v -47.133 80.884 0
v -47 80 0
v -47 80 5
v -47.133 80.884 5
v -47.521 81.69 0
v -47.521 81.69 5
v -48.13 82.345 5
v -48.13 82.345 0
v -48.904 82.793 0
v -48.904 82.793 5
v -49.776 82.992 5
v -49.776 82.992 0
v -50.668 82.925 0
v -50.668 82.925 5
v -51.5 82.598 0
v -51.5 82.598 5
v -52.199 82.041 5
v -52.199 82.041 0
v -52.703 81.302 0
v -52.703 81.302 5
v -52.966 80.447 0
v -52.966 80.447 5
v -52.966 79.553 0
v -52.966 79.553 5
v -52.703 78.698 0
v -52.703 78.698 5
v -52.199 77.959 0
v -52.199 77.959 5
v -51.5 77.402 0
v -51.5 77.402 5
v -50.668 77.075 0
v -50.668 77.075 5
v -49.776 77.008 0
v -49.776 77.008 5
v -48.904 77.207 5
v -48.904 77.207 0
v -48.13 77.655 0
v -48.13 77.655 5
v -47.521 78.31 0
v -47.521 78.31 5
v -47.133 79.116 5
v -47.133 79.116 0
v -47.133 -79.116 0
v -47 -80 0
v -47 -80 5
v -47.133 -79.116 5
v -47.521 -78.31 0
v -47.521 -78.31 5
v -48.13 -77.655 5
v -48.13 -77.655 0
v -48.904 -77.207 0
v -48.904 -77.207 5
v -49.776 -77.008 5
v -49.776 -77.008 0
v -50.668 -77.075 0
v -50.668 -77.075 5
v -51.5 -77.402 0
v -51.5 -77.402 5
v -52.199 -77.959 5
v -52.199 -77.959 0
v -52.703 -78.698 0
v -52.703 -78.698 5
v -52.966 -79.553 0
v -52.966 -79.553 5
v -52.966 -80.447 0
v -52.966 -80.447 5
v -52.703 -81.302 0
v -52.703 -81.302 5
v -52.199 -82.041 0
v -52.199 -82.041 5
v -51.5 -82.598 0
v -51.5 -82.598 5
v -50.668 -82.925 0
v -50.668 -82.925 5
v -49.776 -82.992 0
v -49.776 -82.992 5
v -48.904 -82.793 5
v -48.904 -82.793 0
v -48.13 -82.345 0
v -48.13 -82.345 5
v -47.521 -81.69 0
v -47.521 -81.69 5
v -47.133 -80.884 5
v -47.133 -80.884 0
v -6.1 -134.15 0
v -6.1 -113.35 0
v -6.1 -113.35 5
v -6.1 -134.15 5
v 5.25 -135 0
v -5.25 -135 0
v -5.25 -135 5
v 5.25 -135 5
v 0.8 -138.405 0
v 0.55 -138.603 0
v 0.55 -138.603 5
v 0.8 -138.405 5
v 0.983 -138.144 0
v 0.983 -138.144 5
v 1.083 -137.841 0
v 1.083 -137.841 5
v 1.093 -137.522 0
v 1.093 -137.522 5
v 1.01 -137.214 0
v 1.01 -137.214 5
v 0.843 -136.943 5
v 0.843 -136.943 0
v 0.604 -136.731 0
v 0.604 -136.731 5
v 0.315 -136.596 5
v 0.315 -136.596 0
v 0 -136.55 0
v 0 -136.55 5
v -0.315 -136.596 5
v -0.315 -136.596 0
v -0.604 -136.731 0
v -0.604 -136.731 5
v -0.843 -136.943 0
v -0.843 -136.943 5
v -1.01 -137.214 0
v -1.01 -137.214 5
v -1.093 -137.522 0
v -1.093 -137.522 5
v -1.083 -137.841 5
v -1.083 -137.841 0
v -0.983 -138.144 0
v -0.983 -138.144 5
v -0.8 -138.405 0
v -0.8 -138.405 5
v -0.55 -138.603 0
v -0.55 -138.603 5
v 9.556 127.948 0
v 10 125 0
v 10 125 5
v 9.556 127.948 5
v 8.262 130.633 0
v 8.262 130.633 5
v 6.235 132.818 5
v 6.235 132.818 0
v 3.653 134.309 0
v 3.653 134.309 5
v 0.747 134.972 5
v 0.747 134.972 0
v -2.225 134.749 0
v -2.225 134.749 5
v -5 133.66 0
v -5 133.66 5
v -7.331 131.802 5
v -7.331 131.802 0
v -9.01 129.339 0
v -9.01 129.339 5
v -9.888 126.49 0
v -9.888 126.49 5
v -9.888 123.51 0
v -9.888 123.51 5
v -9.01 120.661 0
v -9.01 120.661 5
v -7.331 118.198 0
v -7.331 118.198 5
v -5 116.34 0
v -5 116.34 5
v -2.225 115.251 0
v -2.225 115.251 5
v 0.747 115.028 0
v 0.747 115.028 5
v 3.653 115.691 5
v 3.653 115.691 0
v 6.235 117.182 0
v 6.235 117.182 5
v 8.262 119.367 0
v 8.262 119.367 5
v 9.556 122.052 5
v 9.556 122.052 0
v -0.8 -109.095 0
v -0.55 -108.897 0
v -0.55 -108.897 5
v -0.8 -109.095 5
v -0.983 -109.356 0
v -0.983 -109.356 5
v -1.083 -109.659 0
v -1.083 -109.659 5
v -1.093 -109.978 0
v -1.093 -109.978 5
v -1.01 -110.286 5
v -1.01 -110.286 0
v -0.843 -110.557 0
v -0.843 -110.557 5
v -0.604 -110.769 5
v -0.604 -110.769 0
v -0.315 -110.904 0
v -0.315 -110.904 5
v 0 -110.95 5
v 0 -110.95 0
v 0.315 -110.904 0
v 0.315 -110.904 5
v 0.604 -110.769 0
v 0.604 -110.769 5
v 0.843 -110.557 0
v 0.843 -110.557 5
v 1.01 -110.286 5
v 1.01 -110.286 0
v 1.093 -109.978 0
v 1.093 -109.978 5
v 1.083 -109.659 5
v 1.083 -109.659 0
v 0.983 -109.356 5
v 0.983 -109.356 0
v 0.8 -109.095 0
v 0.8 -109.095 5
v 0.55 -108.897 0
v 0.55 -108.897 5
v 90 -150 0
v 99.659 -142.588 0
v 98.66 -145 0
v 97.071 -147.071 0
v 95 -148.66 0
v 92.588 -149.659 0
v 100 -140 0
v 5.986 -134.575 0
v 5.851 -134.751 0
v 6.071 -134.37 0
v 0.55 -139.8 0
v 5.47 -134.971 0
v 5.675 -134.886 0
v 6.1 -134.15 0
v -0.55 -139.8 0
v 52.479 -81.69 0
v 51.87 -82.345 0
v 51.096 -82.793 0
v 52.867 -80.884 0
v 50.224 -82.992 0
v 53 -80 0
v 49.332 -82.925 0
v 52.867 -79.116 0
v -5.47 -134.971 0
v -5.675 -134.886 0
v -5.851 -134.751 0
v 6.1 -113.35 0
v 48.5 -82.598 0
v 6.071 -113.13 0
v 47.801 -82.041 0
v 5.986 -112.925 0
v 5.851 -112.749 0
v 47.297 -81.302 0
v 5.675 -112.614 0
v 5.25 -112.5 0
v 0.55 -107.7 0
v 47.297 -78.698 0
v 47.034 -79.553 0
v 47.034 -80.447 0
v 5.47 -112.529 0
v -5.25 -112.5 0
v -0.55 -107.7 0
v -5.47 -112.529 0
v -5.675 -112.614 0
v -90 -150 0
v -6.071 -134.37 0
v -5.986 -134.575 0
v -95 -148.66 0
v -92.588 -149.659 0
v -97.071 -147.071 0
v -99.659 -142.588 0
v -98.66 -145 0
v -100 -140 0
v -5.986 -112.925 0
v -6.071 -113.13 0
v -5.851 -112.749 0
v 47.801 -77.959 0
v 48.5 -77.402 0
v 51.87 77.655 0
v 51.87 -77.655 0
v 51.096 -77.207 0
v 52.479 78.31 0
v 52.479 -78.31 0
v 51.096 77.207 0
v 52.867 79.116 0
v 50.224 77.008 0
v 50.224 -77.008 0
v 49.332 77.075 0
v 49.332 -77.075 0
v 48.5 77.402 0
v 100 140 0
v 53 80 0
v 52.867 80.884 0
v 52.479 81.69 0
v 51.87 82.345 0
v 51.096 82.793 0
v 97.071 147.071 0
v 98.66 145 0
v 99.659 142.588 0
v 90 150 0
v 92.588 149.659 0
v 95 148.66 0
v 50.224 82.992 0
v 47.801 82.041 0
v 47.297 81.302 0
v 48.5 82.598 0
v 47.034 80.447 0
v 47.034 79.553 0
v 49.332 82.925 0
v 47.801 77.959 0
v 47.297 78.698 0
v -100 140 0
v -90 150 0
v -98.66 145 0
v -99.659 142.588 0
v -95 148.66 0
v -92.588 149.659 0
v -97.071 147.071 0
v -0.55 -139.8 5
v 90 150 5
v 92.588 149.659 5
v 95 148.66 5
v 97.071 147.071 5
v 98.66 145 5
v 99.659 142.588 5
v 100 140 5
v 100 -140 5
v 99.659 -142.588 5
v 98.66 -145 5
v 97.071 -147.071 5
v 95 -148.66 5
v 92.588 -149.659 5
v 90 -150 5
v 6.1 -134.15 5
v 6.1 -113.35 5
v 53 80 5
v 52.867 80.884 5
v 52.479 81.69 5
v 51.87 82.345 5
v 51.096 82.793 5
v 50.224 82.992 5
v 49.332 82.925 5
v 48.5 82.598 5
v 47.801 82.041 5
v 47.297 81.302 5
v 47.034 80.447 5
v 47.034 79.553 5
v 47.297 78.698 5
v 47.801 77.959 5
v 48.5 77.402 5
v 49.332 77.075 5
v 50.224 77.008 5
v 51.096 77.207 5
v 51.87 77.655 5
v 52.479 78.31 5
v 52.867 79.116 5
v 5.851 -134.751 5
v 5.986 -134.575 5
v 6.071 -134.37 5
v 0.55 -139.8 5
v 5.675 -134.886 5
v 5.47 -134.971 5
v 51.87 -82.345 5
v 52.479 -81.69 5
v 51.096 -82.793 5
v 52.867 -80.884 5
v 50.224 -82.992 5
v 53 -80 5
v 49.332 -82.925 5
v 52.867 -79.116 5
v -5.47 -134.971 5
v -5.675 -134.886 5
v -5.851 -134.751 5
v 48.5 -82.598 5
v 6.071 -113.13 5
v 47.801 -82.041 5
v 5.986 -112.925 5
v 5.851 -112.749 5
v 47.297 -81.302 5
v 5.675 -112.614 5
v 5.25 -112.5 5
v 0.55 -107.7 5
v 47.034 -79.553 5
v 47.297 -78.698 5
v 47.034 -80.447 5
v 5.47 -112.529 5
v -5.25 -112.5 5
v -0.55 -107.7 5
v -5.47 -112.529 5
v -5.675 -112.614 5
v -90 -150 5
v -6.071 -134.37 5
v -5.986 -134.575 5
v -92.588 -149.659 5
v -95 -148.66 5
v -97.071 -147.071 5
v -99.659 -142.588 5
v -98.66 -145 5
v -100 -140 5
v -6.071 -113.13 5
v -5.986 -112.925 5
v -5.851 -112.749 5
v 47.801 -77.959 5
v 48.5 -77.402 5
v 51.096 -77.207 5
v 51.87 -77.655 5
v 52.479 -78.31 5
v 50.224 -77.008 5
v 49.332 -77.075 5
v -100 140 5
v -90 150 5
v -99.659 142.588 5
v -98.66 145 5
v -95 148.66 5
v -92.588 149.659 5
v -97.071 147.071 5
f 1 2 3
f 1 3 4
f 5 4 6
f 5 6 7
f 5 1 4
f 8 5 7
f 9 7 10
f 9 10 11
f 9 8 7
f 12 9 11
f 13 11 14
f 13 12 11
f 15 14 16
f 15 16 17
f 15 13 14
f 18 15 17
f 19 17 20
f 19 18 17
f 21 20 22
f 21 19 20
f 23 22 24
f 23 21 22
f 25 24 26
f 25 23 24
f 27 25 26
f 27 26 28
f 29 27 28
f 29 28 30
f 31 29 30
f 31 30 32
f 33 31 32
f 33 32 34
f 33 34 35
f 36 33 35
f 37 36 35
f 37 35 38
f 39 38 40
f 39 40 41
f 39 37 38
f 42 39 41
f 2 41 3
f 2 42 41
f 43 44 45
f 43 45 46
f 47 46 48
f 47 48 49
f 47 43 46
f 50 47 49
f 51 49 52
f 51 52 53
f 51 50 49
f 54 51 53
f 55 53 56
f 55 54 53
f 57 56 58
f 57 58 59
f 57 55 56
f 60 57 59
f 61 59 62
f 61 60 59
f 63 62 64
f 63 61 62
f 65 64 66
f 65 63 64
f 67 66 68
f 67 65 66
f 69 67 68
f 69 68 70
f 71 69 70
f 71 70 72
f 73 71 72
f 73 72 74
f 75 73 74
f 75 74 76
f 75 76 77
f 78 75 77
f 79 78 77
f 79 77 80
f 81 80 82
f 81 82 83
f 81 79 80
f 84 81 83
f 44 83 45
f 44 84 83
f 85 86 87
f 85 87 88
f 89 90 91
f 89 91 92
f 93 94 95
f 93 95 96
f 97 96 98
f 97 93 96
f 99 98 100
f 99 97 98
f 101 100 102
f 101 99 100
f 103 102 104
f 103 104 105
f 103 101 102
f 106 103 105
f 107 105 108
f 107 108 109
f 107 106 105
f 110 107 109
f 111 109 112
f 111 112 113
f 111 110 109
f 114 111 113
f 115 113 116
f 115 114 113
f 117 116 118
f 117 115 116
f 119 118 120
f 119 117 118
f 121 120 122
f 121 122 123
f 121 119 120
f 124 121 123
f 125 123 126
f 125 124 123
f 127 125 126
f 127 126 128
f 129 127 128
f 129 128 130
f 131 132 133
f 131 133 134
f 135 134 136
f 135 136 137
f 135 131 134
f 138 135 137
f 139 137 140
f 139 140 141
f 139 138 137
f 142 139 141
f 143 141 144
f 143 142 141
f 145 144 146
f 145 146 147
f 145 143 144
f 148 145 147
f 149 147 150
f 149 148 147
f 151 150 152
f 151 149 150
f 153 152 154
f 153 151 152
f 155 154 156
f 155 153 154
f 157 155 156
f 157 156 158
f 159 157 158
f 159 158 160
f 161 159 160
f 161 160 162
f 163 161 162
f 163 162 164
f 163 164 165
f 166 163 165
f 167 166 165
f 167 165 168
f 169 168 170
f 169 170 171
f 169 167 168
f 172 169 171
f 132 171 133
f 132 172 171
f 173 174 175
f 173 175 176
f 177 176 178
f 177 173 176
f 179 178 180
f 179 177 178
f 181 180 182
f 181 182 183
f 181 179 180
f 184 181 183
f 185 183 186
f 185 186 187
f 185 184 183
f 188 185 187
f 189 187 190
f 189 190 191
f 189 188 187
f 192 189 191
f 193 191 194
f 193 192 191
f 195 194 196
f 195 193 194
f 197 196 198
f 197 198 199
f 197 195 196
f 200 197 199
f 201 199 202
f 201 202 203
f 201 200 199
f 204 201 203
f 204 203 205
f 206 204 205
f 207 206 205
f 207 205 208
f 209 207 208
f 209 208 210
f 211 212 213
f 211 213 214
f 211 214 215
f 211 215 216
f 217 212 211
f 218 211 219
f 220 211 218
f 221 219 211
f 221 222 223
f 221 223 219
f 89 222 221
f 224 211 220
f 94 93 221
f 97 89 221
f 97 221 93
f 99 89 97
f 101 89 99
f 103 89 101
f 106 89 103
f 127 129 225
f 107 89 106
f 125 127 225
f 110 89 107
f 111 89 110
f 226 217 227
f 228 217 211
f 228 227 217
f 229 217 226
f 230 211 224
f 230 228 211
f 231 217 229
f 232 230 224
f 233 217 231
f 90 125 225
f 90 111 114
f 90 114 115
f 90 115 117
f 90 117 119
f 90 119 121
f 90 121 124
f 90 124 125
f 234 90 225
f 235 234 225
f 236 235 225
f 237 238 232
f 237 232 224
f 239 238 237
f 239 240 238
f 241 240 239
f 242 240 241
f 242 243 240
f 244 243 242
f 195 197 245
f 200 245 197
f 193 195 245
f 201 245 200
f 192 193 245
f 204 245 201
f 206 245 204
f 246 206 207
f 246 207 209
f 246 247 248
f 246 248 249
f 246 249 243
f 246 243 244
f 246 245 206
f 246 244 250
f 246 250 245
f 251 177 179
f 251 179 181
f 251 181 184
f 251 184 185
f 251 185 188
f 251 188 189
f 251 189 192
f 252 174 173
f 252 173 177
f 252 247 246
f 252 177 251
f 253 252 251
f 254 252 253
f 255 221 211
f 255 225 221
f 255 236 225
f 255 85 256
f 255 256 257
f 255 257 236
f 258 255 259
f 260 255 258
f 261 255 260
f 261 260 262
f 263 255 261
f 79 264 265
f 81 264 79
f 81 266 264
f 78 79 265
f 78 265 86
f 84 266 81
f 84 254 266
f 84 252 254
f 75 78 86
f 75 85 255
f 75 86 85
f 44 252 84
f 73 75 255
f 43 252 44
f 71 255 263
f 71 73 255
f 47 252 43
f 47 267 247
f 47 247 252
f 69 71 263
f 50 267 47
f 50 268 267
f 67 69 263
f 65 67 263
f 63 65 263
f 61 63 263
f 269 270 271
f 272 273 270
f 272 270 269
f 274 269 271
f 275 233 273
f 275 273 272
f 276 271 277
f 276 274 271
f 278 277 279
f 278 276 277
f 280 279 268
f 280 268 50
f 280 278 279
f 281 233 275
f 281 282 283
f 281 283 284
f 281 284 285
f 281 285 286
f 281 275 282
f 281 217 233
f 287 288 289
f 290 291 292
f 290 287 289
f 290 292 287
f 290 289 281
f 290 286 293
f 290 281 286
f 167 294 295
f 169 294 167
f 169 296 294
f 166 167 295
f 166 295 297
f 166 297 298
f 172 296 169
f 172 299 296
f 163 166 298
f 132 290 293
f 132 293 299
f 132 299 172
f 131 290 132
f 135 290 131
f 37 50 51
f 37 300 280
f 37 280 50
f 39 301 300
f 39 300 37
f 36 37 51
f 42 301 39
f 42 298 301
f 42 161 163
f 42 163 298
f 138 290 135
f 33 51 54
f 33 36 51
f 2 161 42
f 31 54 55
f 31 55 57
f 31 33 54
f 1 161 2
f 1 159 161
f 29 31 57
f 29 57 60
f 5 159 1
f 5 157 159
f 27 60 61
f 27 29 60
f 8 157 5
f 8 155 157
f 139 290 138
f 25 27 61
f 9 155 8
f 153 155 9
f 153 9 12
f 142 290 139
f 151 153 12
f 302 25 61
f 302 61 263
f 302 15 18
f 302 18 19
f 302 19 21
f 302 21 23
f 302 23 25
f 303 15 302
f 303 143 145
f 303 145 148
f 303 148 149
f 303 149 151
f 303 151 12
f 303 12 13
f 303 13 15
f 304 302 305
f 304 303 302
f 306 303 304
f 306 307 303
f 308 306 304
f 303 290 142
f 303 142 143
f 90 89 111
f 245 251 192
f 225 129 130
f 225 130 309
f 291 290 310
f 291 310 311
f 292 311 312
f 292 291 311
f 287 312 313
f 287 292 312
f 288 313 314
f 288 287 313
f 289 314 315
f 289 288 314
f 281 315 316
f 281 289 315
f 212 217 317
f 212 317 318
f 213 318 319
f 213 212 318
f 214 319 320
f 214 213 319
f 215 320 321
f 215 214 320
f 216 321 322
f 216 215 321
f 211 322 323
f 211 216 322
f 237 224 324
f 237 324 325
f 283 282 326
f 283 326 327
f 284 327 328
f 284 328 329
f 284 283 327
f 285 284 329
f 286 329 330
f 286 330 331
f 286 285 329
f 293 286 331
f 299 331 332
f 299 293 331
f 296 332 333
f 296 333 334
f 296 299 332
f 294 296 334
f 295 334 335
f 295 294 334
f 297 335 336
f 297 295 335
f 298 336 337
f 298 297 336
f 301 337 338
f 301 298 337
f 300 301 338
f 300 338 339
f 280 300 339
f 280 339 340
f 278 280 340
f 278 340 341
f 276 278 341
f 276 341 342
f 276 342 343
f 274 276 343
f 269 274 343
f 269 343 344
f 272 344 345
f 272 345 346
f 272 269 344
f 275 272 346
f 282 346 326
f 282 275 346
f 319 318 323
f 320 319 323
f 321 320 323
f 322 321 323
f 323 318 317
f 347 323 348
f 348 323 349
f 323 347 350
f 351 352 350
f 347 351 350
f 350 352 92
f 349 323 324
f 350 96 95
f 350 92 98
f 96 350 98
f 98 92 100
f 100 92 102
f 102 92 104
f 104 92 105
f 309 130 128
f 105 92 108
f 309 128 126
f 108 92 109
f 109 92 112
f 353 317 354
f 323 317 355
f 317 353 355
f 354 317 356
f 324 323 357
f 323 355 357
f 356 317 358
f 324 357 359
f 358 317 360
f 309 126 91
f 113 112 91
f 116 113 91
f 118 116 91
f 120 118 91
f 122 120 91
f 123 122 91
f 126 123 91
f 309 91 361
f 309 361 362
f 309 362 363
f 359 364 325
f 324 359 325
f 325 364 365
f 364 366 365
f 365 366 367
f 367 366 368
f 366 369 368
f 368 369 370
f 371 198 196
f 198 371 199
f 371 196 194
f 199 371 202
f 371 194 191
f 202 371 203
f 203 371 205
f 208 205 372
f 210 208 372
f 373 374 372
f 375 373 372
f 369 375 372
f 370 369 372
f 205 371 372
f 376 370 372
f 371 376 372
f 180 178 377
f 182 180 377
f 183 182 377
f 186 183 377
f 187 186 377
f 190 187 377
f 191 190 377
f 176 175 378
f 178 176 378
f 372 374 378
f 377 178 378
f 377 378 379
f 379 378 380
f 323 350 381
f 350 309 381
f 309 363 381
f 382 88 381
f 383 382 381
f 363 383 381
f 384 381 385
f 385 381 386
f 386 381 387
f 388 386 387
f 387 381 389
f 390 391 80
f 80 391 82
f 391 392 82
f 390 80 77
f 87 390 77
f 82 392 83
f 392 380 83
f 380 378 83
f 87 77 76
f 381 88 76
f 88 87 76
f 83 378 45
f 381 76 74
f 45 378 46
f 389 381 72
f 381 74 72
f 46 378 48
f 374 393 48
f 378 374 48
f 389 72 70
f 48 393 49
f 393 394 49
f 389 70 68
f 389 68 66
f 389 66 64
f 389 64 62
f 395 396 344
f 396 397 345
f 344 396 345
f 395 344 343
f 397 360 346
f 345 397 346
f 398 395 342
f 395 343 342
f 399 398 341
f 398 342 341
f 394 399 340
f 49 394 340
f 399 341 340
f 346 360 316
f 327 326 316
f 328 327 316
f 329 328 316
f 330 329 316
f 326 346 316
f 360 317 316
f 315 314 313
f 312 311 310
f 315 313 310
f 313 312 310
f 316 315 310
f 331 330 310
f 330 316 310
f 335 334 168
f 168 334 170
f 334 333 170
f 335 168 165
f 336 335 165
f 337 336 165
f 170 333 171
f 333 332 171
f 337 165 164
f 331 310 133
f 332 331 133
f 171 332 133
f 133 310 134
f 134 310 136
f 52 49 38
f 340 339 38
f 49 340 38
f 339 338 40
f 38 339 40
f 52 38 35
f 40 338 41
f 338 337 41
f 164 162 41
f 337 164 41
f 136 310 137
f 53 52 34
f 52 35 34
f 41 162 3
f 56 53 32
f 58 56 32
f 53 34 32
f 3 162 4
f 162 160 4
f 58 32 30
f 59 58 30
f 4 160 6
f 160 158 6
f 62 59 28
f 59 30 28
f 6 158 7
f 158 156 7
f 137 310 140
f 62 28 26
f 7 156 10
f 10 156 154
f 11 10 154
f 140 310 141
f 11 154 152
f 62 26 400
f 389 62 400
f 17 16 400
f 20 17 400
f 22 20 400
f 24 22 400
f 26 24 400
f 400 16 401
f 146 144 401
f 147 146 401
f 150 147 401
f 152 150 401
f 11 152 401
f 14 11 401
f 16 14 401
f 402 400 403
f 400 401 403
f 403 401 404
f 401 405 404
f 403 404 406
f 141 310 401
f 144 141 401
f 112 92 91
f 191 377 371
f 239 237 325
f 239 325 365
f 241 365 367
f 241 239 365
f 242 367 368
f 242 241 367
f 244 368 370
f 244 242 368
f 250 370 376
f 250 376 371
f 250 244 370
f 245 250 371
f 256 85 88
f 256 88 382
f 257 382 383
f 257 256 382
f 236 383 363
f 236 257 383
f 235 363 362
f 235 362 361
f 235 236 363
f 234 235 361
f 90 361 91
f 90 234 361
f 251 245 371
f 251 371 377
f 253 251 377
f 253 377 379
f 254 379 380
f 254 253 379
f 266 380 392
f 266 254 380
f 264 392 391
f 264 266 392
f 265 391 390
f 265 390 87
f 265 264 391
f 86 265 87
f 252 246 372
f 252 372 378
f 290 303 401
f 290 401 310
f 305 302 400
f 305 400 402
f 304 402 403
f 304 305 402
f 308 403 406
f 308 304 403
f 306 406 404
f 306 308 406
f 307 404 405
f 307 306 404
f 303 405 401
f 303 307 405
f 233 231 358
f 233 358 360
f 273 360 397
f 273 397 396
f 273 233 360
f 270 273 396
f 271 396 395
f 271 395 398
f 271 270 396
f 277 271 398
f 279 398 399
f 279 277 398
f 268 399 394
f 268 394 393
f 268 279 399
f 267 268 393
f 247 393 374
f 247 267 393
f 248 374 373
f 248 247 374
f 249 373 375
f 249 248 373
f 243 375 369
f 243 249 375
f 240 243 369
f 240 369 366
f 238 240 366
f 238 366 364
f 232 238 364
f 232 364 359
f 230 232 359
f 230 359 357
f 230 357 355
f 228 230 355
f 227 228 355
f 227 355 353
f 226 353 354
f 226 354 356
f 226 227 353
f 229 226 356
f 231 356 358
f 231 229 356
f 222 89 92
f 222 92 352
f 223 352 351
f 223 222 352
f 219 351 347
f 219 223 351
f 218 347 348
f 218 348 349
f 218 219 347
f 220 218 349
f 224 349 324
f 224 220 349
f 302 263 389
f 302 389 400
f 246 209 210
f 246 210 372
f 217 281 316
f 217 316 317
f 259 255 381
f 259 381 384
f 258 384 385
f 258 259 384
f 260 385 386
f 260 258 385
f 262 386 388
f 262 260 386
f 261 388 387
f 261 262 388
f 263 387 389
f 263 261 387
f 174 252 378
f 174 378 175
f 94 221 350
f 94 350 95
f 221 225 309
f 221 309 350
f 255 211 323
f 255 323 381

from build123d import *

# Parameters (mm, degrees)
SKETCH1_R           = 10
SKETCH1_R_2         = 3
BOSS_EXTRUDE1_DEPTH = 5


with BuildPart() as part:
    # Sketch1 → Boss-Extrude1 (new body)
    with BuildSketch(Plane.XY):
        with BuildLine():
            Line((-90, 150), (90, 150))
            ThreePointArc((90, 150), (97.071067812, 147.071067812), (100, 140))
            Line((100, 140), (100, -140))
            ThreePointArc((100, -140), (97.071067812, -147.071067812), (90, -150))
            Line((90, -150), (-90, -150))
            ThreePointArc((-90, -150), (-97.071067812, -147.071067812), (-100, -140))
            Line((-100, -140), (-100, 140))
            ThreePointArc((-100, 140), (-97.071067812, 147.071067812), (-90, 150))
        make_face()
        with Locations((0, 125)):
            Circle(SKETCH1_R, mode=Mode.SUBTRACT)
        with Locations((50, 80)):
            Circle(SKETCH1_R_2, mode=Mode.SUBTRACT)
        with Locations((-50, 80)):
            Circle(SKETCH1_R_2, mode=Mode.SUBTRACT)
        with Locations((-50, -80)):
            Circle(SKETCH1_R_2, mode=Mode.SUBTRACT)
        with Locations((50, -80)):
            Circle(SKETCH1_R_2, mode=Mode.SUBTRACT)
        with BuildLine():
            Line((-0.55, -138.602627944), (-0.55, -139.8))
            Line((-0.55, -139.8), (0.55, -139.8))
            Line((0.55, -139.8), (0.55, -138.602627944))
            ThreePointArc((0.55, -138.602627944), (0, -136.55), (-0.55, -138.602627944))
        make_face(mode=Mode.SUBTRACT)
        with BuildLine():
            Line((-0.55, -107.7), (-0.55, -108.897372056))
            ThreePointArc((-0.55, -108.897372056), (0, -110.95), (0.55, -108.897372056))
            Line((0.55, -108.897372056), (0.55, -107.7))
            Line((0.55, -107.7), (-0.55, -107.7))
        make_face(mode=Mode.SUBTRACT)
        with BuildLine():
            Line((-6.1, -113.35), (-6.1, -134.15))
            ThreePointArc((-6.1, -134.15), (-5.851040764, -134.751040764), (-5.25, -135))
            Line((-5.25, -135), (5.25, -135))
            ThreePointArc((5.25, -135), (5.851040764, -134.751040764), (6.1, -134.15))
            Line((6.1, -134.15), (6.1, -113.35))
            ThreePointArc((6.1, -113.35), (5.851040764, -112.748959236), (5.25, -112.5))
            Line((5.25, -112.5), (-5.25, -112.5))
            ThreePointArc((-5.25, -112.5), (-5.851040764, -112.748959236), (-6.1, -113.35))
        make_face(mode=Mode.SUBTRACT)
    extrude(amount=BOSS_EXTRUDE1_DEPTH)


solid = part.part
